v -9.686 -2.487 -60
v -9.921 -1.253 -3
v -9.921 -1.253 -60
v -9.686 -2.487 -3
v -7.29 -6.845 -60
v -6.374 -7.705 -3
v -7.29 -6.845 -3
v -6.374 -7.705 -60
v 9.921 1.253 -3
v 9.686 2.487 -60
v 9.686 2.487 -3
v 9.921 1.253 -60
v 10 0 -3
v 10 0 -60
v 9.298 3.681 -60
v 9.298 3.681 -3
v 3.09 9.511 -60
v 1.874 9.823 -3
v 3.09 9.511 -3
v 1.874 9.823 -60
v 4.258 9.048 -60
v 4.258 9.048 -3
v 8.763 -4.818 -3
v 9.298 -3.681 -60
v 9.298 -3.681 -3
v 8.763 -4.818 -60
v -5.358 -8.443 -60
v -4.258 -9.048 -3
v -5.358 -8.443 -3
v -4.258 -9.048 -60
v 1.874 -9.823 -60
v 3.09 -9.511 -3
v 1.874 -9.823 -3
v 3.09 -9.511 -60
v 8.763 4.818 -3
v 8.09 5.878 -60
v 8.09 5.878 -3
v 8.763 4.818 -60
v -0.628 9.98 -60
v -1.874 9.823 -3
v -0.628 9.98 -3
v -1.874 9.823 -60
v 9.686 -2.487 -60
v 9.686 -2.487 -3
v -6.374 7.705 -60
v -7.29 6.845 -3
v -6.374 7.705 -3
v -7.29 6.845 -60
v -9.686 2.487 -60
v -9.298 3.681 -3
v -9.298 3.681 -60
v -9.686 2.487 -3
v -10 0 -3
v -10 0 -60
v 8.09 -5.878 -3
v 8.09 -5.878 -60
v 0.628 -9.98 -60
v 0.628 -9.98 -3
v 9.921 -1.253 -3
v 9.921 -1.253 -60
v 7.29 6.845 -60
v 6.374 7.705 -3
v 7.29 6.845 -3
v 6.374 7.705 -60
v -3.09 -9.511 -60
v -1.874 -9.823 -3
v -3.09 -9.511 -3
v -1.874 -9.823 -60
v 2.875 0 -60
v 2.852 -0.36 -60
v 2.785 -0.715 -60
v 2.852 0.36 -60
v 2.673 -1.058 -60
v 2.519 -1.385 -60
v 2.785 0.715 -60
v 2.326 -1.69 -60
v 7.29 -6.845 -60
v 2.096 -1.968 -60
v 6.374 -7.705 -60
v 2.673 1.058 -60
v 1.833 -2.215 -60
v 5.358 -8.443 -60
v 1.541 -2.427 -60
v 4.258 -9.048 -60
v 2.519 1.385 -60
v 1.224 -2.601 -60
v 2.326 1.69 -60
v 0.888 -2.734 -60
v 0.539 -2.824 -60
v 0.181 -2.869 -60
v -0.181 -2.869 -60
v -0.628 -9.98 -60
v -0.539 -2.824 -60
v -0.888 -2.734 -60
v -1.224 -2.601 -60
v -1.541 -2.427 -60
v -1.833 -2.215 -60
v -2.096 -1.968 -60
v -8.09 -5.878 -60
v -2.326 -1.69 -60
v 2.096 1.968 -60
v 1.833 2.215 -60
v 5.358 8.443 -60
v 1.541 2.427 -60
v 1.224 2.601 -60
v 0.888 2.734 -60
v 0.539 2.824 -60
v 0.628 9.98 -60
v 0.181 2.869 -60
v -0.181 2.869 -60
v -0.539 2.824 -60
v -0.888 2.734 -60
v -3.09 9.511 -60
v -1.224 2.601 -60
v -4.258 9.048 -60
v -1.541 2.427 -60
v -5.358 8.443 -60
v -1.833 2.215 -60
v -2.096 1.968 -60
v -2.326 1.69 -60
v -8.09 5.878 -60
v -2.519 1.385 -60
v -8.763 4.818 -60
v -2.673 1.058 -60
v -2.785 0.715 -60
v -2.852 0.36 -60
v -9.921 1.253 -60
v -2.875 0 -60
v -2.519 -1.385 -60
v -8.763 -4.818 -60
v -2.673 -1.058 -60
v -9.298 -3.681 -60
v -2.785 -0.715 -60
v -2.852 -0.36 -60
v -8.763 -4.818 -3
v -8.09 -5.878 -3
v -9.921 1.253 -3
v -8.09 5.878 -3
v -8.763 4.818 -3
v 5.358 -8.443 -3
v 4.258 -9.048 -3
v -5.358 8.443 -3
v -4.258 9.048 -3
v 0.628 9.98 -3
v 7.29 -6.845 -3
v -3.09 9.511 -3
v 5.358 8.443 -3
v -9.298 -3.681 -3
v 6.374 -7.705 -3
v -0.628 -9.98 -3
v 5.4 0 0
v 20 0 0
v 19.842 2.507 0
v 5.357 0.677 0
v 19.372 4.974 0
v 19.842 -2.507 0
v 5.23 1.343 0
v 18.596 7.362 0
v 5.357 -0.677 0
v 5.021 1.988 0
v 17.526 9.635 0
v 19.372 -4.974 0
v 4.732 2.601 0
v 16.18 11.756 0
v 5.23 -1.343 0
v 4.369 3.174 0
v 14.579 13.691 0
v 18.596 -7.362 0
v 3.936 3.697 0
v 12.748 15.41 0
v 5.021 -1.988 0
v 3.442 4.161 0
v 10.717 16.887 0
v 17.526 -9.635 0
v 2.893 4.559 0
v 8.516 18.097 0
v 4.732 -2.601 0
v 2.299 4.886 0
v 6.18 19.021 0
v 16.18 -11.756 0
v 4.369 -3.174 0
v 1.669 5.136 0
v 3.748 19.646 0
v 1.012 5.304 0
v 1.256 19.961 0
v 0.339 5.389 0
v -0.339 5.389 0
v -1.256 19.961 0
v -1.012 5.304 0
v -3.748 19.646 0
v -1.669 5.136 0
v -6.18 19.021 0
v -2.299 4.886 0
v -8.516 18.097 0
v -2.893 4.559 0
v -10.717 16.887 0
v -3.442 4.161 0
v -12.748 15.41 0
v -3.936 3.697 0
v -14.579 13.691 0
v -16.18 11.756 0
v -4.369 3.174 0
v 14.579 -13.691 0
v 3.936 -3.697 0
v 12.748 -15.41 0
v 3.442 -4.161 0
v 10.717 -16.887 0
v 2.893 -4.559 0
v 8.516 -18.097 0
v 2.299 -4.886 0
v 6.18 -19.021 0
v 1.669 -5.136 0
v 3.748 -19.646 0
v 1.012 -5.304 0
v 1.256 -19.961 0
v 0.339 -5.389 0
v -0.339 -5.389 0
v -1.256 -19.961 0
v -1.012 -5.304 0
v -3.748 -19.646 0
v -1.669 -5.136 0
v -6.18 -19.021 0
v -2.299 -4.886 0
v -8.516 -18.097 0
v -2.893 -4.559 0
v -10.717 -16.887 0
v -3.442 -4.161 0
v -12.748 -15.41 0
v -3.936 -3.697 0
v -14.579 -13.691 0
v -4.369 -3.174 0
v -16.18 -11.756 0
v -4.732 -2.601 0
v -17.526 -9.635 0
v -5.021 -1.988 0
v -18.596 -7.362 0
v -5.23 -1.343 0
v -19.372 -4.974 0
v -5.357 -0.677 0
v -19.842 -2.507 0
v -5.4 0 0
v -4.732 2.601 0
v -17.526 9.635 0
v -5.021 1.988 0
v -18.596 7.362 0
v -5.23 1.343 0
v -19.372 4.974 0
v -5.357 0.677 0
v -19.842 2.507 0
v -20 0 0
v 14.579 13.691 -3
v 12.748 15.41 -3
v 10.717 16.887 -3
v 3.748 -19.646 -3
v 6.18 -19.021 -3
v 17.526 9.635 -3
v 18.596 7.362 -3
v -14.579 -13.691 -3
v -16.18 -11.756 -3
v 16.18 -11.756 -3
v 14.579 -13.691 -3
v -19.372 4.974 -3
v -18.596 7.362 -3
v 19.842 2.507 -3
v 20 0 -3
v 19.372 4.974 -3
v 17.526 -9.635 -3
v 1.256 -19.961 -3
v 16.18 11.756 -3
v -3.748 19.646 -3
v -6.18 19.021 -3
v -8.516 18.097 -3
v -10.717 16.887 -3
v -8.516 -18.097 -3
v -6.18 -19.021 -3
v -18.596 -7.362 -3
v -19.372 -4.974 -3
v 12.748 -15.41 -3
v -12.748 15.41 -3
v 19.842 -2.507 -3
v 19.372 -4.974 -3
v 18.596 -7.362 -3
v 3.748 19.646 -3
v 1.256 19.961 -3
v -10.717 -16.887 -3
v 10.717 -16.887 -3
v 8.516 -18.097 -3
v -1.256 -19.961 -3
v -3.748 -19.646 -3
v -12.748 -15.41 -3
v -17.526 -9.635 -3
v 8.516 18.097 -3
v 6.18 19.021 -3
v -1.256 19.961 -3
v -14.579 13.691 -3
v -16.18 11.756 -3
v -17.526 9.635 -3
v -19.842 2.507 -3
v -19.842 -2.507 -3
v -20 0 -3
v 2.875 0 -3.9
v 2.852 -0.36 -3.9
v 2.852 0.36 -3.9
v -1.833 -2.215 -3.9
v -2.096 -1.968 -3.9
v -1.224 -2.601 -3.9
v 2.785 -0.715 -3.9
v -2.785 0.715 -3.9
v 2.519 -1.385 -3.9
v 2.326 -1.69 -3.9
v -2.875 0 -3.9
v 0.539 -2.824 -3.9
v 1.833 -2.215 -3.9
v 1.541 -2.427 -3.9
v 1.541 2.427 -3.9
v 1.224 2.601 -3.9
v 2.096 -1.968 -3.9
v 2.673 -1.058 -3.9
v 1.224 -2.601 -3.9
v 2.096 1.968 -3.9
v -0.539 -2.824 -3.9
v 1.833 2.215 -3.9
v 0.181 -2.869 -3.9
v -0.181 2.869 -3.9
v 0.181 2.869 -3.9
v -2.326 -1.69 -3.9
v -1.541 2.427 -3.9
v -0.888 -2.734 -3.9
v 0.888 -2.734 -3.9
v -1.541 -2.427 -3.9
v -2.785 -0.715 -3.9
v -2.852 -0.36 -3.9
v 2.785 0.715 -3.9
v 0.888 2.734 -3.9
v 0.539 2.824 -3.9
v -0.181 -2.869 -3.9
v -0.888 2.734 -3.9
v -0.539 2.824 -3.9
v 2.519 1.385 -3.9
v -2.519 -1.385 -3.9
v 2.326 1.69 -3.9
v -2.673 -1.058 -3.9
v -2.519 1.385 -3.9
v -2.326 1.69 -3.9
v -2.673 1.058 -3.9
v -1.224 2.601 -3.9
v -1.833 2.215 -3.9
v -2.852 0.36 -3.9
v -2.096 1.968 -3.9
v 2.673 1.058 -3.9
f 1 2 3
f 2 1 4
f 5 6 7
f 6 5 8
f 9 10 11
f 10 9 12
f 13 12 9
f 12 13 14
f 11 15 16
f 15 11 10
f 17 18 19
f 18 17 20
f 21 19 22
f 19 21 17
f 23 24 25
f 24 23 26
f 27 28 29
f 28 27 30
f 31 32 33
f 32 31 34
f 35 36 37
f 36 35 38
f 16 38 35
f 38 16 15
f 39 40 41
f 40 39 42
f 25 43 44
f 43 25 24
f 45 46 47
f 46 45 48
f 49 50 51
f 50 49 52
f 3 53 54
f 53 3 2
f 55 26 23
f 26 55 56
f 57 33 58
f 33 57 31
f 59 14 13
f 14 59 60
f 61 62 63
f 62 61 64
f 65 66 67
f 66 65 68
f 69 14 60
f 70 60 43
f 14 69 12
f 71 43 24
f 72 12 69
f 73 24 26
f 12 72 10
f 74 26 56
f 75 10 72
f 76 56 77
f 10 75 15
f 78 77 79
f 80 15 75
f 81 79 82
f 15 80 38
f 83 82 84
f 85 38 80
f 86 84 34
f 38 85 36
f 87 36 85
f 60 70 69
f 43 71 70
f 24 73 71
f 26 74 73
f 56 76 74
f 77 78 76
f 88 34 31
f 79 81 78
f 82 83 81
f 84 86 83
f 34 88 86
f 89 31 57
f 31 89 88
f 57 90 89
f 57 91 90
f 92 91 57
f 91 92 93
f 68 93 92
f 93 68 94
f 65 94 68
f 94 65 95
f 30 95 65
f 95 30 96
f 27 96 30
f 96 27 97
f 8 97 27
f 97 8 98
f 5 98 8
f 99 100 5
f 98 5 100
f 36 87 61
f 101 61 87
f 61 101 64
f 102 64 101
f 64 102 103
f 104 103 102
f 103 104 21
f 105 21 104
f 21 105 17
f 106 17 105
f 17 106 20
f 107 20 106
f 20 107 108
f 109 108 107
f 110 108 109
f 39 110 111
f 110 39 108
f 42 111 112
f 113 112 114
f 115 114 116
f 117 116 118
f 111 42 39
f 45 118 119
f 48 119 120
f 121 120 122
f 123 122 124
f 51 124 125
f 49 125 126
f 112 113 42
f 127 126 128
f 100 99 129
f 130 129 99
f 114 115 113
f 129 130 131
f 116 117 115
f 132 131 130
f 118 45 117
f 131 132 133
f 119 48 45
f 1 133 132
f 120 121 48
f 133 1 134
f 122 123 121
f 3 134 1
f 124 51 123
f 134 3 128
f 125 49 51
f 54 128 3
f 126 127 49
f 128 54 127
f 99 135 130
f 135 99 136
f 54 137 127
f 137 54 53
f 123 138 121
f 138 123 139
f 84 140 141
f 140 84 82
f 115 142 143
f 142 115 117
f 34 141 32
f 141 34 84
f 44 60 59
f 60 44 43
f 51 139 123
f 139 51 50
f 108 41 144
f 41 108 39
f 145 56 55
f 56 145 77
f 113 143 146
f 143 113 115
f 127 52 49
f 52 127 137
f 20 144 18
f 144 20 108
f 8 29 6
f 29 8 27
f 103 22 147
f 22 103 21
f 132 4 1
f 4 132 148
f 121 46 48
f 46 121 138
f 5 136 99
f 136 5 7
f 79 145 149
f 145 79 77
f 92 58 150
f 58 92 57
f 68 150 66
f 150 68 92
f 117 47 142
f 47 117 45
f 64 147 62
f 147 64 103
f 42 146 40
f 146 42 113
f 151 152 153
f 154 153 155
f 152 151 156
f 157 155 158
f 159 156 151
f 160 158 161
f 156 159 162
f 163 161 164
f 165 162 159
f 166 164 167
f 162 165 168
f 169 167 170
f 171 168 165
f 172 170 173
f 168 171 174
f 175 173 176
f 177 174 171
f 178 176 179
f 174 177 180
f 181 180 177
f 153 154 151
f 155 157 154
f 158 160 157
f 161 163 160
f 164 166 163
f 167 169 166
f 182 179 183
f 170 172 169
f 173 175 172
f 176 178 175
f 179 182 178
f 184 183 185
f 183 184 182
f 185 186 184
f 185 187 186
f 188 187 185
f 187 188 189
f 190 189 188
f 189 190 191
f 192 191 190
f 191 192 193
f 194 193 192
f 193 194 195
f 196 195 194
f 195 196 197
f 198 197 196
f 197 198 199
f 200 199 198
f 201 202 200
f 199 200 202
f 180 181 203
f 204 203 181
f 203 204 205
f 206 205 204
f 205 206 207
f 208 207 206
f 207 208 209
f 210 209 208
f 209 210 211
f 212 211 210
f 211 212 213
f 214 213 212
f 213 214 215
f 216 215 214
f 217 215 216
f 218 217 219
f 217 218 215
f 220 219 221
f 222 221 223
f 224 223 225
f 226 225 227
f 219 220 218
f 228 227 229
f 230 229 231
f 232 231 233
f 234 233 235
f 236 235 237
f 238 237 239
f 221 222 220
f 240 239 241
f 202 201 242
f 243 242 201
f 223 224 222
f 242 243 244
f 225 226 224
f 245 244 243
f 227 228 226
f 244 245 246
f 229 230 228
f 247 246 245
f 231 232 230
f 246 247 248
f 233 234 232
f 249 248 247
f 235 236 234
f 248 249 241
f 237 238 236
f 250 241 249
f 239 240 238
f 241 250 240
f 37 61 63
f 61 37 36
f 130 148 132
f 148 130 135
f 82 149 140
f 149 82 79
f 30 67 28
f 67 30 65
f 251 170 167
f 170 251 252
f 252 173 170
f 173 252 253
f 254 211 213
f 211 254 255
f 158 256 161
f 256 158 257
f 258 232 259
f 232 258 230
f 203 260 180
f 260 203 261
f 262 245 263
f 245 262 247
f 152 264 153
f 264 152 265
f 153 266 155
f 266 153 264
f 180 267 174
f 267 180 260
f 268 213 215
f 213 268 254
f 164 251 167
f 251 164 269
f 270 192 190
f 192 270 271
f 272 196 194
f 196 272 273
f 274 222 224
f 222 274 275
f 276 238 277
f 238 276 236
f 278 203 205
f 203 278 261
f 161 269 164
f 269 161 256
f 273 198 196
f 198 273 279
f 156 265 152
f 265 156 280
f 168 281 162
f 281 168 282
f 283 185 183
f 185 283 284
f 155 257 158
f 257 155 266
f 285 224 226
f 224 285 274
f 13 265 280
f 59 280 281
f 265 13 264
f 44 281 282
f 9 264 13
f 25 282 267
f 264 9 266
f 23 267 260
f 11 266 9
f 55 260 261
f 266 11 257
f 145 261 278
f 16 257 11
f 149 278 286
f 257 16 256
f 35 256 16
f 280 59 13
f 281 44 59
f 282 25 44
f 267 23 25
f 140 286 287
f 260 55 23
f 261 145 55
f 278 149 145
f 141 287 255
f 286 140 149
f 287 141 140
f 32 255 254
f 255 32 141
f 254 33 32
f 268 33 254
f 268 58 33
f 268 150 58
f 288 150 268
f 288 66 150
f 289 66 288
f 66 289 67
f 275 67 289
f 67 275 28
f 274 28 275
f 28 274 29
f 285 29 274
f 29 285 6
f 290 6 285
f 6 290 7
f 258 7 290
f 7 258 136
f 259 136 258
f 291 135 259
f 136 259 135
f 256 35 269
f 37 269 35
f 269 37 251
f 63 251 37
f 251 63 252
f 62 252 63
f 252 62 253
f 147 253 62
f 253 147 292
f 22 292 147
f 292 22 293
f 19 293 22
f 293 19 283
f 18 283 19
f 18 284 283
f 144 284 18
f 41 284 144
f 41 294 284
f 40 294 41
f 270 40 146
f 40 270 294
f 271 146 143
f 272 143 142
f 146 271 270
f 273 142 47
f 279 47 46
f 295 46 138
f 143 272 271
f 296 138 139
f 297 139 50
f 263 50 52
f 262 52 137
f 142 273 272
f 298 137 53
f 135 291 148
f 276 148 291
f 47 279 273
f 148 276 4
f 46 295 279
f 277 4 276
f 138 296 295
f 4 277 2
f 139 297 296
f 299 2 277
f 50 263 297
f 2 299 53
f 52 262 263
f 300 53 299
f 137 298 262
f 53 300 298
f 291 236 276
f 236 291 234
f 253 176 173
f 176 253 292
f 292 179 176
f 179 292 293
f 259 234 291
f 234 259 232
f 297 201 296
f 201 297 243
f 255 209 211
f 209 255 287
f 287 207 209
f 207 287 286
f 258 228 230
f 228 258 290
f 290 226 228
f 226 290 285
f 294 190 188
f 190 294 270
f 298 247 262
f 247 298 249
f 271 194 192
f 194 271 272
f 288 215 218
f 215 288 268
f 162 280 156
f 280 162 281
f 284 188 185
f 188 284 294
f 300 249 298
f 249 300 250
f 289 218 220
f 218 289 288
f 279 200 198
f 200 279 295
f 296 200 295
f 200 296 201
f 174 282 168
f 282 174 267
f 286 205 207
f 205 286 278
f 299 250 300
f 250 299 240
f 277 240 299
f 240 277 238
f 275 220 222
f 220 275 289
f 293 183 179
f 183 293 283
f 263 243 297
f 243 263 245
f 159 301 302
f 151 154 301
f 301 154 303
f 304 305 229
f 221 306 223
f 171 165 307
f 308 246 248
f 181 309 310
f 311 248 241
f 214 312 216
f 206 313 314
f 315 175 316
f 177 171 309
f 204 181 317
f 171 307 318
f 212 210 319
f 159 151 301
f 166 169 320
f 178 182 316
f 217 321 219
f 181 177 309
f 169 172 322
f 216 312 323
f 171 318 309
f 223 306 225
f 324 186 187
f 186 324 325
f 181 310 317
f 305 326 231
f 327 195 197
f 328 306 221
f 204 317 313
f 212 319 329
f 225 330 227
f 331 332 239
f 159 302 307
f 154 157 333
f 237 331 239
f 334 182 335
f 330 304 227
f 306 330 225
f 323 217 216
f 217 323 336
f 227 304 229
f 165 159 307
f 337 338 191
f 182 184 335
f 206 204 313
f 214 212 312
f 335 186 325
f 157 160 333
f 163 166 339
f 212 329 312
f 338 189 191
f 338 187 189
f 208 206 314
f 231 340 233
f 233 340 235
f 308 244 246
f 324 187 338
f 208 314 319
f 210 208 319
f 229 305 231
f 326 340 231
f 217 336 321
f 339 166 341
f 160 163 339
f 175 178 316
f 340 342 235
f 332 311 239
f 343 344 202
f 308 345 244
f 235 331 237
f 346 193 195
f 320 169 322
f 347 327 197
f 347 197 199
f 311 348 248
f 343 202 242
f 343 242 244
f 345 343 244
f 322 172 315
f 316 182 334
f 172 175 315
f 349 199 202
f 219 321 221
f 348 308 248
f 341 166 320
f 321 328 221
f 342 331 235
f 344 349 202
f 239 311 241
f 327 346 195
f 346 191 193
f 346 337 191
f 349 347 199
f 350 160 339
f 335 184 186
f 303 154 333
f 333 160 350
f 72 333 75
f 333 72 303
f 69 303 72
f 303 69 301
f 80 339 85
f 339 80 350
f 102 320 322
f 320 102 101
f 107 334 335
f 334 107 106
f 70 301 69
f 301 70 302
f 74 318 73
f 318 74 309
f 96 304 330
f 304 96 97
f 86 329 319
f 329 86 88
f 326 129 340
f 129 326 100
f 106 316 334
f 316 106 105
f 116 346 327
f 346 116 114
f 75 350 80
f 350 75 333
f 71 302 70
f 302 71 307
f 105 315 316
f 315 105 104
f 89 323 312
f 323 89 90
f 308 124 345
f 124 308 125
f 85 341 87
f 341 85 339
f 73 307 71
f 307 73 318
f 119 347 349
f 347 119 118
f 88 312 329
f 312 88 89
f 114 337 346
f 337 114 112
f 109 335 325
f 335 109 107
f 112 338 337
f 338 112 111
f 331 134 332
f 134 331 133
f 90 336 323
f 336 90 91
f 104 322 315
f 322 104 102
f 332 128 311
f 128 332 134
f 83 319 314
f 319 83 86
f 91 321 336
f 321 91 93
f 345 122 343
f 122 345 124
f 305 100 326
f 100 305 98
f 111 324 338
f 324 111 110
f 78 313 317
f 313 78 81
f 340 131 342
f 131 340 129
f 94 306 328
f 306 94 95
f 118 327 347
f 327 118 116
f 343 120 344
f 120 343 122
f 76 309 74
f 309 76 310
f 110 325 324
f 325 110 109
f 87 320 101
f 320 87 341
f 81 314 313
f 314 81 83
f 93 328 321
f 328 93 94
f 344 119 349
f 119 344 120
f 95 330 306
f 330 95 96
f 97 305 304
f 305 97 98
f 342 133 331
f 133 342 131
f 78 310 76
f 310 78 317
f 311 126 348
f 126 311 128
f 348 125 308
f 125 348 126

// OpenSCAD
$fn = 50;


difference() {
	union() {
		translate(v = [0, 0, -60.0000000000]) {
			cylinder(h = 60, r = 10.0000000000);
		}
		translate(v = [0, 0, -3.0000000000]) {
			cylinder(h = 3, r = 20.0000000000);
		}
	}
	union() {
		translate(v = [0, 0, 0]) {
			rotate(a = [0, 0, 0]) {
				difference() {
					union() {
						#translate(v = [0, 0, -60.0000000000]) {
							cylinder(h = 60, r = 2.6000000000);
						}
						#translate(v = [0, 0, -3.9000000000]) {
							cylinder(h = 3.9000000000, r1 = 2.8750000000, r2 = 5.4000000000);
						}
						#translate(v = [0, 0, -60.0000000000]) {
							cylinder(h = 60, r = 2.8750000000);
						}
						#translate(v = [0, 0, -60.0000000000]) {
							cylinder(h = 60, r = 2.6000000000);
						}
					}
					union();
				}
			}
		}
	}
}
